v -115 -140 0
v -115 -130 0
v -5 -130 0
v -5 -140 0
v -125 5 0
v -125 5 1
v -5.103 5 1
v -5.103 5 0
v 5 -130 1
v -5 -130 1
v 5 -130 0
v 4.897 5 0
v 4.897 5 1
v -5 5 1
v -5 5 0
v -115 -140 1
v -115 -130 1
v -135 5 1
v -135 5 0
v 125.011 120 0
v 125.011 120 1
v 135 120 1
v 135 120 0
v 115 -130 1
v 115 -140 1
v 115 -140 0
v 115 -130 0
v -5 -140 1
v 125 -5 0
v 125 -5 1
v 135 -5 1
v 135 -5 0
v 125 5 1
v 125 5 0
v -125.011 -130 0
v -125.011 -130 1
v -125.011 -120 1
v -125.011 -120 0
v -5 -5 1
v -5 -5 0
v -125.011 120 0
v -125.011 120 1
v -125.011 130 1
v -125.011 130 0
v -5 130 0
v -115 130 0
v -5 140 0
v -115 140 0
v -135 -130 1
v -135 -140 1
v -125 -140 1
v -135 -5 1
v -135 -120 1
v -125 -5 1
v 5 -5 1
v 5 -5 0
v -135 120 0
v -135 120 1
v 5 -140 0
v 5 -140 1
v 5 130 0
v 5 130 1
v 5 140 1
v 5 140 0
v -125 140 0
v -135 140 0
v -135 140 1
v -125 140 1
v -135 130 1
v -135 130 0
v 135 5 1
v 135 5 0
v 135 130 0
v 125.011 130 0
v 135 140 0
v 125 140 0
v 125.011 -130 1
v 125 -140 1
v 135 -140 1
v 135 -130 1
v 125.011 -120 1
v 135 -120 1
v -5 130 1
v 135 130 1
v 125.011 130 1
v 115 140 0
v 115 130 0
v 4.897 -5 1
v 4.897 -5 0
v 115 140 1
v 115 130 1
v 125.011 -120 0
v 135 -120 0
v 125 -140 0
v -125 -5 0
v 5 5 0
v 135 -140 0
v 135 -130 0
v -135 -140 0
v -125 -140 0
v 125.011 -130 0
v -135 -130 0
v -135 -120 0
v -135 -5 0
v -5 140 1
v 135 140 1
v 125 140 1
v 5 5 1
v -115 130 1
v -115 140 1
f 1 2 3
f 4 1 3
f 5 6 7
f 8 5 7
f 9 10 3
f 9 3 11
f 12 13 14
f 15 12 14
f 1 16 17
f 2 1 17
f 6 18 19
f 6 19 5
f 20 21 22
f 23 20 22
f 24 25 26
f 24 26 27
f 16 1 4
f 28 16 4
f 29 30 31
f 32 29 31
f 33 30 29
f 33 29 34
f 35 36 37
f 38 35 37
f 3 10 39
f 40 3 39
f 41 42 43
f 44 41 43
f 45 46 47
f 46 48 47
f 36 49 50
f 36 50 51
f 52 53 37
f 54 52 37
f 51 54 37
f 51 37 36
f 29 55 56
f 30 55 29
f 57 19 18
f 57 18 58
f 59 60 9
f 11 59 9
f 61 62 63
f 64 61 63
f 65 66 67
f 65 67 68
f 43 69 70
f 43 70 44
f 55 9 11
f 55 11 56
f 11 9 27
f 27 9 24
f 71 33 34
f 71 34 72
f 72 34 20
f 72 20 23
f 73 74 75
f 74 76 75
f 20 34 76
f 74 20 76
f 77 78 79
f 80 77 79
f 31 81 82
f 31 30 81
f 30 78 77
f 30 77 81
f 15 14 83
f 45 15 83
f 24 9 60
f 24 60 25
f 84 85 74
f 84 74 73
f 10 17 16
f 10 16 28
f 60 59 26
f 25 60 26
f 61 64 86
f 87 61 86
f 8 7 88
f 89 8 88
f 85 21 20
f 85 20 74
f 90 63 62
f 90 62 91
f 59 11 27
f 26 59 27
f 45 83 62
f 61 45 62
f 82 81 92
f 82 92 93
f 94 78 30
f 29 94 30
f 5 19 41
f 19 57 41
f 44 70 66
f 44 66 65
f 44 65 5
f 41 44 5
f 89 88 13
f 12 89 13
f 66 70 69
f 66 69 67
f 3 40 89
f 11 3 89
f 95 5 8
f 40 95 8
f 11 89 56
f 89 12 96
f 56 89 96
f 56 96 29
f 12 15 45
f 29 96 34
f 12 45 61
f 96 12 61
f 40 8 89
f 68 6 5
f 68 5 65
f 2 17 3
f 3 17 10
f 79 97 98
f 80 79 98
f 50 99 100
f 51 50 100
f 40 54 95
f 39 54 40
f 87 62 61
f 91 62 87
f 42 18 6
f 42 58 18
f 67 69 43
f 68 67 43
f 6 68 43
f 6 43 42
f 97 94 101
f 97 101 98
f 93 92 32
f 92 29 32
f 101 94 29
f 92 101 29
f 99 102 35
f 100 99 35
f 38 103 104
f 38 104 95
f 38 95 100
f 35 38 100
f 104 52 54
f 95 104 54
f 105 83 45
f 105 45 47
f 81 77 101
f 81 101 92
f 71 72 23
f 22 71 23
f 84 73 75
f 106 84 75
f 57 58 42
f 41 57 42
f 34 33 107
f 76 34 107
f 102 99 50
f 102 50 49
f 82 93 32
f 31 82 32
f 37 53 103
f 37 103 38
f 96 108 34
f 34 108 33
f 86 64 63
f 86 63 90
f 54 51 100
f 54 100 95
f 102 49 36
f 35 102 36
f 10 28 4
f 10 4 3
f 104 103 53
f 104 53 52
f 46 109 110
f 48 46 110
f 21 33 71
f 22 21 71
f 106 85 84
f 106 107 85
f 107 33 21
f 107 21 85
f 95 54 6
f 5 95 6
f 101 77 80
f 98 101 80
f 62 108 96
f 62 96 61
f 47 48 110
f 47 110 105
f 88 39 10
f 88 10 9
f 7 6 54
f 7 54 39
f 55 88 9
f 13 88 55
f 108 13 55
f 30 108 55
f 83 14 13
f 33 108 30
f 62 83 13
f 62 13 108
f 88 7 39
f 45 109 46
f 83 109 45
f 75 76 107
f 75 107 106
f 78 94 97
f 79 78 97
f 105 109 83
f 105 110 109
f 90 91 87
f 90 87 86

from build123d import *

# Parameters (mm, degrees)
F0_W      = 270
F0_H      = 280
F1_DEPTH  = 1
F2_W      = 120
F2_H      = 125
F3_DEPTH  = 1.001
F4_W      = 10
F4_H      = 10
F5_DEPTH  = 1.001
F6_W      = 10
F6_H      = 10
F7_DEPTH  = 1.001
F9_DEPTH  = 1.001
F10_W     = 10
F10_H     = 10
F11_DEPTH = 1.001
F12_W     = 10
F12_H     = 10
F13_DEPTH = 1.001


with BuildPart() as f1:
    # F0 (on Top) → F1 (new body)
    with BuildSketch(Plane.XY):
        Rectangle(F0_W, F0_H)
    extrude(amount=F1_DEPTH)

    # F2 (on face) → F3 (cut, through all)
    with BuildSketch(Plane.XY.offset(1)):
        with Locations((-65, 67.5)):
            Rectangle(F2_W, F2_H)
        with Locations((65, 67.5)):
            Rectangle(F2_W, F2_H)
        with Locations((65, -67.5)):
            Rectangle(F2_W, F2_H)
        with Locations((-65, -67.5)):
            Rectangle(F2_W, F2_H)
    extrude(amount=-F3_DEPTH, mode=Mode.SUBTRACT)

    # F4 (on face) → F5 (cut, through all)
    with BuildSketch(Plane.XY.offset(1)):
        with Locations((-130.011037, 125)):
            Rectangle(F4_W, F4_H)
        with Locations((130.011037, 125)):
            Rectangle(F4_W, F4_H)
        with Locations((-130.011037, -125)):
            Rectangle(F4_W, F4_H)
        with Locations((130.011037, -125)):
            Rectangle(F4_W, F4_H)
    extrude(amount=-F5_DEPTH, mode=Mode.SUBTRACT)

    # F6 (on face) → F7 (cut, through all)
    with BuildSketch(Plane.XY.offset(1)):
        with Locations((120, 135)):
            Rectangle(F6_W, F6_H)
        with Locations((-120, -135)):
            Rectangle(F6_W, F6_H)
        with Locations((120, -135)):
            Rectangle(F6_W, F6_H)
        with Locations((-120, 135)):
            Rectangle(F6_W, F6_H)
    extrude(amount=-F7_DEPTH, mode=Mode.SUBTRACT)

    # F8 (on face) → F9 (cut, through all)
    with BuildSketch(Plane.XY.offset(1)):
        Polygon((-5, 5), (-5.102537, 5), (4.897463, -5), (4.897463, 5), align=None)
    extrude(amount=-F9_DEPTH, mode=Mode.SUBTRACT)

    # F10 (on face) → F11 (cut, through all)
    with BuildSketch(Plane.XY.offset(1)):
        with Locations((-130, 0)):
            Rectangle(F10_W, F10_H)
        with Locations((130, 0)):
            Rectangle(F10_W, F10_H)
    extrude(amount=-F11_DEPTH, mode=Mode.SUBTRACT)

    # F12 (on face) → F13 (cut, through all)
    with BuildSketch(Plane.XY.offset(1)):
        with Locations((0, -135)):
            Rectangle(F12_W, F12_H)
        with Locations((0, 135)):
            Rectangle(F12_W, F12_H)
    extrude(amount=-F13_DEPTH, mode=Mode.SUBTRACT)


solid = f1.part
